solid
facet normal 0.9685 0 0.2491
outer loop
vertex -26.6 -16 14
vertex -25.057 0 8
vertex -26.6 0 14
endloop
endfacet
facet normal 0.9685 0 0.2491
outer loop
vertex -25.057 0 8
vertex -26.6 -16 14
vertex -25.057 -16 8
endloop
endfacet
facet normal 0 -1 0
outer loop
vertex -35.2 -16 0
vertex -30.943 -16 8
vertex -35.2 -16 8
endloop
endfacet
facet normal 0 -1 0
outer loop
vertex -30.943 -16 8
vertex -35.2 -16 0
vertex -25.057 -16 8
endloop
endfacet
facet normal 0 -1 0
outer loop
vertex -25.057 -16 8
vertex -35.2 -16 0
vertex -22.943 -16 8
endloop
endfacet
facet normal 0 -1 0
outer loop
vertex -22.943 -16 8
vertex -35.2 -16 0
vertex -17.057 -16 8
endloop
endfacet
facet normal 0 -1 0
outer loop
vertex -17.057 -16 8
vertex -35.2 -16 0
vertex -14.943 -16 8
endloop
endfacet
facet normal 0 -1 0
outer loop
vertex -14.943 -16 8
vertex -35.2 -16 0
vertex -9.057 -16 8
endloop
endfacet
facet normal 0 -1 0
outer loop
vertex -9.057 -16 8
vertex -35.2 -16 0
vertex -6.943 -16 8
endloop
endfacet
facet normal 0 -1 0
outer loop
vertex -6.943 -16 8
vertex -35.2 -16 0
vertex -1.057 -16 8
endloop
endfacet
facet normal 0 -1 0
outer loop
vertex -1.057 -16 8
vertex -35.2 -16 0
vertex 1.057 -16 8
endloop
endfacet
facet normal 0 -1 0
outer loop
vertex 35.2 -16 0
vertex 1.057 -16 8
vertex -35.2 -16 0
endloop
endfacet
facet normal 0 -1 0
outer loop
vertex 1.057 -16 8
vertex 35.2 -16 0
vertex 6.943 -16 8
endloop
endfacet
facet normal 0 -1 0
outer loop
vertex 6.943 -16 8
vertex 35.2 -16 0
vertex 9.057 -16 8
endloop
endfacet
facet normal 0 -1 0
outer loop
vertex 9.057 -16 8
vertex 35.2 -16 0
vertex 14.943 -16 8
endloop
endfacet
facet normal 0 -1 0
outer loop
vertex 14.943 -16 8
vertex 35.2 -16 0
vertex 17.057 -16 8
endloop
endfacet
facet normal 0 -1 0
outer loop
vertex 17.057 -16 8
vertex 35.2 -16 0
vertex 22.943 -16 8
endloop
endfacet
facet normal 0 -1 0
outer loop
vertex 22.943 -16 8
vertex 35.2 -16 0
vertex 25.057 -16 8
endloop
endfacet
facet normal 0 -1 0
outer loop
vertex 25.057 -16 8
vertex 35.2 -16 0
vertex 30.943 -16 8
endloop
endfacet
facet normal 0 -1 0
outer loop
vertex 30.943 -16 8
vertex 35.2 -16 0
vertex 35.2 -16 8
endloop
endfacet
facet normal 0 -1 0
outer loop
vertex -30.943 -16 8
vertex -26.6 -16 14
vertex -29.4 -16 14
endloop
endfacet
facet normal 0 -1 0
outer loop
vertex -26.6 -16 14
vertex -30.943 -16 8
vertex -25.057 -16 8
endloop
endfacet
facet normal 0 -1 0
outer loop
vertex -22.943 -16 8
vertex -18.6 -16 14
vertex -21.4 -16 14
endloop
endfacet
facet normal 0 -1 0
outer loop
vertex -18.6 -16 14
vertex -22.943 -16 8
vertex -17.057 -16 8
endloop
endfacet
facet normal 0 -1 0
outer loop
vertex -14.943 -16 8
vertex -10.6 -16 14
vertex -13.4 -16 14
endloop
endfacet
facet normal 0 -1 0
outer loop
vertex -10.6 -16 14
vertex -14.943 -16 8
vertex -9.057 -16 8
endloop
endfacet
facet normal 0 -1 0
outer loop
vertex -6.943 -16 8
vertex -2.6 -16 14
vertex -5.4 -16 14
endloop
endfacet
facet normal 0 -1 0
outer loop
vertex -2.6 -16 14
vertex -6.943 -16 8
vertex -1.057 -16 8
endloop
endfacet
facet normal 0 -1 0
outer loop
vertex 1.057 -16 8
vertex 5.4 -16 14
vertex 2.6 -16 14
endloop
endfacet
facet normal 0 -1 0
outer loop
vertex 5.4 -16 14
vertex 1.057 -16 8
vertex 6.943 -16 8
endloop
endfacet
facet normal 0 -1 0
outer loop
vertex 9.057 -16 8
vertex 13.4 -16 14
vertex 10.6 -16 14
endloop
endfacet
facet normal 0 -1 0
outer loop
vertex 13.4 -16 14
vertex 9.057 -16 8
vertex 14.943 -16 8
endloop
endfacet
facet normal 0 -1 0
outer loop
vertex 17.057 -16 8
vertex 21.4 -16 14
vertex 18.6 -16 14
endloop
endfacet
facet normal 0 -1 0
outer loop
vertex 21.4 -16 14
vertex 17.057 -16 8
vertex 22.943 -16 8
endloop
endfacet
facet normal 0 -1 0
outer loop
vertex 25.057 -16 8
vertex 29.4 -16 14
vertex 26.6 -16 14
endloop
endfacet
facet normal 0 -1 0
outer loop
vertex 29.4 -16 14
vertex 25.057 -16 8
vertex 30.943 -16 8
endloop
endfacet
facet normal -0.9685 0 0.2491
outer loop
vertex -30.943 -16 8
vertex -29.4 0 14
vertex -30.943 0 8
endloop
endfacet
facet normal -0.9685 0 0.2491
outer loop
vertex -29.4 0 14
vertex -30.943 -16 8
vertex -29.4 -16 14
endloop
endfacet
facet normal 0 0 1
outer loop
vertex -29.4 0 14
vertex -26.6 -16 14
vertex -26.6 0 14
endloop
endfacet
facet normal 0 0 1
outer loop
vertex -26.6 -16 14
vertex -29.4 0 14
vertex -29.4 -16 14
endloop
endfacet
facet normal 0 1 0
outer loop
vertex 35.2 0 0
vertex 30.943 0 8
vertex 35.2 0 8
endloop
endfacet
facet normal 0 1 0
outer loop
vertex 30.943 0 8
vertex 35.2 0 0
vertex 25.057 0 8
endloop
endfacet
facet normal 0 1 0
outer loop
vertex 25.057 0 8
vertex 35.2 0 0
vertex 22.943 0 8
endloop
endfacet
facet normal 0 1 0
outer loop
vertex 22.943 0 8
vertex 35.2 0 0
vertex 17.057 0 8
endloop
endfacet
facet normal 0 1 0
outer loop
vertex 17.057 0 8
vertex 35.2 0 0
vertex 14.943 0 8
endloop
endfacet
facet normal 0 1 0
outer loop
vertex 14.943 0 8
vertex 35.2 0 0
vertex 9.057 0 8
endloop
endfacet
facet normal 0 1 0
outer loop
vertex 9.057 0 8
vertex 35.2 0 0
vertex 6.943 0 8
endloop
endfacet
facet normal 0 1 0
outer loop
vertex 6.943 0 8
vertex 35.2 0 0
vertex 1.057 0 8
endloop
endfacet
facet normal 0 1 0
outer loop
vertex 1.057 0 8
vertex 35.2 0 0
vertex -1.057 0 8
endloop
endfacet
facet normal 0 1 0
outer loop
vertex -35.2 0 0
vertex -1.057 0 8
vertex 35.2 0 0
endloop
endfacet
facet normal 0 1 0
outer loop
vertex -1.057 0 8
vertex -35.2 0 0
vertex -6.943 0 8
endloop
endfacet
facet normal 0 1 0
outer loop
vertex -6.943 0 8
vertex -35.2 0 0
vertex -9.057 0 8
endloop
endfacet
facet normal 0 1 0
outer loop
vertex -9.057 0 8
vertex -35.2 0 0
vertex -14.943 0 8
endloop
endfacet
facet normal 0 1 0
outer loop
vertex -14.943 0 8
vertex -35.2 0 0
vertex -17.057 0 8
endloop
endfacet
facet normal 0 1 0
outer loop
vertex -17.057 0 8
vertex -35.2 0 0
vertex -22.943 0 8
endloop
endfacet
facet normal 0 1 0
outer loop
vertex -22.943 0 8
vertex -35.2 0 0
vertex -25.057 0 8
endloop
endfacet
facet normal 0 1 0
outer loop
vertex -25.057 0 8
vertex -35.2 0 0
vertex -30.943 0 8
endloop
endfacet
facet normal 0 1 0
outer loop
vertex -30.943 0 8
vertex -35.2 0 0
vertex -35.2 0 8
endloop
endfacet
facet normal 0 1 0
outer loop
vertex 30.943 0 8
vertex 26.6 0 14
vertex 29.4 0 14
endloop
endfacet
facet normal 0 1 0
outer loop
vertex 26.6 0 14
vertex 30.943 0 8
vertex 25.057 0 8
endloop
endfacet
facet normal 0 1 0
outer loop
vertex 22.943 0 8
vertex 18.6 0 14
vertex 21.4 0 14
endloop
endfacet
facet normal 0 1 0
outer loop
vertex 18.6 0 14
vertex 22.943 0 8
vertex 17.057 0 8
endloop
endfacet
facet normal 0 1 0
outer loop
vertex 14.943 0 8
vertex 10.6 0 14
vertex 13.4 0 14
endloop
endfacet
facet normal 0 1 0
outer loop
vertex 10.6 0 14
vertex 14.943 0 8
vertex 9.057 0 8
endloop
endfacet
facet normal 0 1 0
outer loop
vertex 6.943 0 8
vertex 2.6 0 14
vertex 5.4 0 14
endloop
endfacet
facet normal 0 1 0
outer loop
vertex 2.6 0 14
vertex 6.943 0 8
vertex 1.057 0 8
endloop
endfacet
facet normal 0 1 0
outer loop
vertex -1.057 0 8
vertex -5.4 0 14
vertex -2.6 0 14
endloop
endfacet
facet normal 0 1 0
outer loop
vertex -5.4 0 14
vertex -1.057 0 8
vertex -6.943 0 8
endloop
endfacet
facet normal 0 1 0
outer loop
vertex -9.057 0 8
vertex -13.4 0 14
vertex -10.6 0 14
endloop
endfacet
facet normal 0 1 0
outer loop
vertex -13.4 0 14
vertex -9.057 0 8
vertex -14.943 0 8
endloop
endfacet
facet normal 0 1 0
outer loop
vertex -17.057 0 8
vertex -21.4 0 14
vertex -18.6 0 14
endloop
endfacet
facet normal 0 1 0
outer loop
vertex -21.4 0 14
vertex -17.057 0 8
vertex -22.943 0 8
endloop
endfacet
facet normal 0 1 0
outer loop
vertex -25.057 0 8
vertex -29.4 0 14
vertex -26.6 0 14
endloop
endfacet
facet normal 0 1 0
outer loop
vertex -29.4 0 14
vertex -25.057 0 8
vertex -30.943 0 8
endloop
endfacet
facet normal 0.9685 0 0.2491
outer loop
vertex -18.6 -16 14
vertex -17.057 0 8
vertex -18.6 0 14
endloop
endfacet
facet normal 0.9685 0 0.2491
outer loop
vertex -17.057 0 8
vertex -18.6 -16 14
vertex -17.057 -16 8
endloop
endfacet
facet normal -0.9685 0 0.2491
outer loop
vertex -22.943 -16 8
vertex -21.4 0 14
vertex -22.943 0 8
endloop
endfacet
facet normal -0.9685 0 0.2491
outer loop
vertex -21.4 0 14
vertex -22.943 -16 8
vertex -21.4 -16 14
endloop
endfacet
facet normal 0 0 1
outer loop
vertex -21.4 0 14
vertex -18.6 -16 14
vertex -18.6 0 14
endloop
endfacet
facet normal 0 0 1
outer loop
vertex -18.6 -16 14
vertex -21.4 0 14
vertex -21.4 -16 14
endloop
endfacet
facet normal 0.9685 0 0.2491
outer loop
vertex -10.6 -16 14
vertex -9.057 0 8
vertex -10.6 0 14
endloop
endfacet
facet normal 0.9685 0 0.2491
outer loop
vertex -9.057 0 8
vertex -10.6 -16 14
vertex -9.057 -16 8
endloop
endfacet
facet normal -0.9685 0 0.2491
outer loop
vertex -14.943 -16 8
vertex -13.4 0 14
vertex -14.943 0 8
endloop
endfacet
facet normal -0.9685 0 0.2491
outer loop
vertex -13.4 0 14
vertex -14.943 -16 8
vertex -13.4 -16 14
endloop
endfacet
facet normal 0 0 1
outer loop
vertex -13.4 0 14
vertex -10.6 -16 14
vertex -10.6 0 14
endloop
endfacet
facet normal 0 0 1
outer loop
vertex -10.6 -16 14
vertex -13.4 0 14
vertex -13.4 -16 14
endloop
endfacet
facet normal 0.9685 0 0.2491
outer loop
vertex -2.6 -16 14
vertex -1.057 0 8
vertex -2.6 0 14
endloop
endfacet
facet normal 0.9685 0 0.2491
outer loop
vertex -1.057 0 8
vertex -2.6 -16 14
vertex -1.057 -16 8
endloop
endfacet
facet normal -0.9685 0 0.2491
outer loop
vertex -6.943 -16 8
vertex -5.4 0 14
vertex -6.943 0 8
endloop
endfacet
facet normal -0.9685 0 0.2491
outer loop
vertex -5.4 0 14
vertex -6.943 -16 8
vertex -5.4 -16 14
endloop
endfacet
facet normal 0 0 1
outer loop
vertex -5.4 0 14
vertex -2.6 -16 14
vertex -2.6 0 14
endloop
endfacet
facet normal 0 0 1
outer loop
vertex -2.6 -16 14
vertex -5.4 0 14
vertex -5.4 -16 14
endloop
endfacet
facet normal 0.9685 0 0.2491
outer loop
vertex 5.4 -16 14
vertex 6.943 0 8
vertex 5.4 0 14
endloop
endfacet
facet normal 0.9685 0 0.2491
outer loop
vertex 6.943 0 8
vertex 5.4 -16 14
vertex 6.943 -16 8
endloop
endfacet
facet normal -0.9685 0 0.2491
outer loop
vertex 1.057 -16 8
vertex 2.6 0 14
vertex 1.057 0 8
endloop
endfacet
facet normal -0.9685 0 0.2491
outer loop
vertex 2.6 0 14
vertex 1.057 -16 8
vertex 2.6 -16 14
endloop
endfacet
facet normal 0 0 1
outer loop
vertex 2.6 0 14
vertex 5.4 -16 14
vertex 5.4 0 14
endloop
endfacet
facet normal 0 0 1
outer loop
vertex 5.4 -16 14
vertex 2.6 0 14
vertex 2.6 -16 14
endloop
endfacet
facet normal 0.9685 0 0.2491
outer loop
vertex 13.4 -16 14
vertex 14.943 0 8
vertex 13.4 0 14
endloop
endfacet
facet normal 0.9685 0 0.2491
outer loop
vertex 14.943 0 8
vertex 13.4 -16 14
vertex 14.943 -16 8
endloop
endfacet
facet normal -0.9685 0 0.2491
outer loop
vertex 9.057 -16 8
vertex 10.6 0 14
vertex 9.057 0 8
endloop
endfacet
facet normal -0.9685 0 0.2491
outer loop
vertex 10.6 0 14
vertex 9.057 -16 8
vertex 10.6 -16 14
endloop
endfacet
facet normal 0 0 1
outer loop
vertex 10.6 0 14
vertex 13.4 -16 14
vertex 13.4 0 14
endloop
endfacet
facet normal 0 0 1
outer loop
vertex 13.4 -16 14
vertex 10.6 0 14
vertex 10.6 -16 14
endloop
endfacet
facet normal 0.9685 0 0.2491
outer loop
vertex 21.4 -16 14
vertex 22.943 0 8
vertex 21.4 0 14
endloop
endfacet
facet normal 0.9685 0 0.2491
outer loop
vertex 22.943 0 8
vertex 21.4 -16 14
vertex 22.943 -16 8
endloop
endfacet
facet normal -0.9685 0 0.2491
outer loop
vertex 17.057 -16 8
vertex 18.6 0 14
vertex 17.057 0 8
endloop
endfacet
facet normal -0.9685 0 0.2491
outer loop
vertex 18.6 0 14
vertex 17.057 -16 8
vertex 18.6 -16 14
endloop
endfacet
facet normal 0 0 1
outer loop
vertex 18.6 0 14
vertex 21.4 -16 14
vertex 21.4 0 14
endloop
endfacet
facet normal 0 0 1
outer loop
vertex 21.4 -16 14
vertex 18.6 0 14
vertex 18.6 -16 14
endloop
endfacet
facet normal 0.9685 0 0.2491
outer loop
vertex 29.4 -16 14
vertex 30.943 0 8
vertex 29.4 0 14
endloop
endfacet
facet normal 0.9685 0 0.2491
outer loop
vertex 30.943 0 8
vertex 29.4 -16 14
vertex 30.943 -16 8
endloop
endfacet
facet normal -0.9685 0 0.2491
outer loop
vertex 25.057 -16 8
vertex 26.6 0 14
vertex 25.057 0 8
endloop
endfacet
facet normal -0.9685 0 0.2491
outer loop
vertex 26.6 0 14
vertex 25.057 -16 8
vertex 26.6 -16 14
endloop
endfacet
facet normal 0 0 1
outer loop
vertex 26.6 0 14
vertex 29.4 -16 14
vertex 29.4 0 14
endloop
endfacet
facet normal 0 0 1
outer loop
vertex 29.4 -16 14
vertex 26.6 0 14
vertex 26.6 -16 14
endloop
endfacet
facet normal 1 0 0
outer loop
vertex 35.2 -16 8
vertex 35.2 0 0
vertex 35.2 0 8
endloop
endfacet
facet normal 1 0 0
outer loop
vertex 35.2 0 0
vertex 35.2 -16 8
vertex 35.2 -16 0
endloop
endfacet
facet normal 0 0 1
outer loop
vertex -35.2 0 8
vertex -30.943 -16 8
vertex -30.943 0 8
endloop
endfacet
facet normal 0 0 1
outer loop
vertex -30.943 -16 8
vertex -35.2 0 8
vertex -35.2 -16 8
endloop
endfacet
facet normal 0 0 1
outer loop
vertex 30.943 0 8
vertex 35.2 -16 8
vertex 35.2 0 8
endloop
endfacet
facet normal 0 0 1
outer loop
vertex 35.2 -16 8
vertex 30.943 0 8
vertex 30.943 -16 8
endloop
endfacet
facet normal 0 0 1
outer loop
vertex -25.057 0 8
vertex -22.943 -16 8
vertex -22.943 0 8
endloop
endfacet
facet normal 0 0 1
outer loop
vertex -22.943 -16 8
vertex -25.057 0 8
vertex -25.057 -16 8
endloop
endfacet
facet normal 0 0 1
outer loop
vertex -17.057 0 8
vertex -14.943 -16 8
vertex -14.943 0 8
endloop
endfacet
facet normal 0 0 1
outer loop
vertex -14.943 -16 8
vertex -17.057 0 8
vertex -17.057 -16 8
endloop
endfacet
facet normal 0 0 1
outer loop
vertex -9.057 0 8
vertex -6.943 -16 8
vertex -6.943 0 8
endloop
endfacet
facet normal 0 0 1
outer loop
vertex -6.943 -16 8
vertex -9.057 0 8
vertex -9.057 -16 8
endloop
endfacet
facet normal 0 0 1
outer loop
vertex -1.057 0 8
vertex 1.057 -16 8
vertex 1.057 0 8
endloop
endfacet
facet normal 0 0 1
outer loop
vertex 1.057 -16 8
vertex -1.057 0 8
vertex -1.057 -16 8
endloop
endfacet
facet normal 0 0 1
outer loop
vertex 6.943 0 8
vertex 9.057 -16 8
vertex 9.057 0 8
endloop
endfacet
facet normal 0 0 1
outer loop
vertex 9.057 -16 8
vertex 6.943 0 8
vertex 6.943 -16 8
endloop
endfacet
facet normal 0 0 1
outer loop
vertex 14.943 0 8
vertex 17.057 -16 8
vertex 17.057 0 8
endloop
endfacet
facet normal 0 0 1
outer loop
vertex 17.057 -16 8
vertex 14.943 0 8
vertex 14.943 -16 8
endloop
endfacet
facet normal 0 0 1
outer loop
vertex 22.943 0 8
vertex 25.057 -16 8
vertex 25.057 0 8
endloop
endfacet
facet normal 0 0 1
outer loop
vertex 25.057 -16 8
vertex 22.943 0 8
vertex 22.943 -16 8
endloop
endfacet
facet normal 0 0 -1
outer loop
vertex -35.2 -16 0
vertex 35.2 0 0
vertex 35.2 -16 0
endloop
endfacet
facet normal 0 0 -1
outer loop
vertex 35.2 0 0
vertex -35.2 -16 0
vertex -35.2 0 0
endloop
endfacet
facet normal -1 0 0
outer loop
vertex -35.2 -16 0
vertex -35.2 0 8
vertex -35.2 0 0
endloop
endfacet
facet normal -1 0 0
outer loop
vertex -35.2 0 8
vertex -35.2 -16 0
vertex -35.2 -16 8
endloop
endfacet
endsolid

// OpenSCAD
$fn = 32;

// ----------------------------------------------------------------------
// Toothed rack, 8 teeth
// 8 mm pitch, 6 mm teeth
// ----------------------------------------------------------------------

// --- parameters (mm) ---
bar_w = 16;     // bar width (Y)
bar_h = 8;      // bar height (Z)
teeth = 8;      // number of teeth
pitch = 8;      // tooth pitch
tooth_h = 6;    // tooth height above the bar
root_w = 6.4;   // tooth width at the root
crest_w = 2.8;  // tooth width at the crest

// --- derived feature positions (mm) ---
span = (teeth - 1) * pitch;  // = 56   distance between the outer teeth
bar_l = span + root_w + 8;   // = 70.4   bar length: teeth plus 4 mm at each end
tooth_x = -span / 2;         // = -28   X of the first tooth
height = bar_h + tooth_h;    // = 14   overall height
feature_centers = [
  [tooth_x + 0 * pitch, -bar_w / 2],
  [tooth_x + 1 * pitch, -bar_w / 2],
  [tooth_x + 2 * pitch, -bar_w / 2],
  [tooth_x + 3 * pitch, -bar_w / 2],
  [tooth_x + 4 * pitch, -bar_w / 2],
  [tooth_x + 5 * pitch, -bar_w / 2],
  [tooth_x + 6 * pitch, -bar_w / 2],
  [tooth_x + 7 * pitch, -bar_w / 2]
];   // tooth centre line, drives the tooth loop

// bar with a rack of teeth, one extruded trapezoium per centre
module rack_tooth() {
  linear_extrude(height = bar_w)
    polygon(points = [
      [0, 0],
      [root_w, 0],
      [root_w / 2 + crest_w / 2, tooth_h + 1],
      [root_w / 2 - crest_w / 2, tooth_h + 1]
    ]);
}

union() {
  translate([-bar_l / 2, -bar_w, 0]) cube([bar_l, bar_w, bar_h]);
  for (centre = feature_centers)
    translate([centre[0] - root_w / 2, 0, bar_h - 1]) rotate([90, 0, 0]) rack_tooth();
}
